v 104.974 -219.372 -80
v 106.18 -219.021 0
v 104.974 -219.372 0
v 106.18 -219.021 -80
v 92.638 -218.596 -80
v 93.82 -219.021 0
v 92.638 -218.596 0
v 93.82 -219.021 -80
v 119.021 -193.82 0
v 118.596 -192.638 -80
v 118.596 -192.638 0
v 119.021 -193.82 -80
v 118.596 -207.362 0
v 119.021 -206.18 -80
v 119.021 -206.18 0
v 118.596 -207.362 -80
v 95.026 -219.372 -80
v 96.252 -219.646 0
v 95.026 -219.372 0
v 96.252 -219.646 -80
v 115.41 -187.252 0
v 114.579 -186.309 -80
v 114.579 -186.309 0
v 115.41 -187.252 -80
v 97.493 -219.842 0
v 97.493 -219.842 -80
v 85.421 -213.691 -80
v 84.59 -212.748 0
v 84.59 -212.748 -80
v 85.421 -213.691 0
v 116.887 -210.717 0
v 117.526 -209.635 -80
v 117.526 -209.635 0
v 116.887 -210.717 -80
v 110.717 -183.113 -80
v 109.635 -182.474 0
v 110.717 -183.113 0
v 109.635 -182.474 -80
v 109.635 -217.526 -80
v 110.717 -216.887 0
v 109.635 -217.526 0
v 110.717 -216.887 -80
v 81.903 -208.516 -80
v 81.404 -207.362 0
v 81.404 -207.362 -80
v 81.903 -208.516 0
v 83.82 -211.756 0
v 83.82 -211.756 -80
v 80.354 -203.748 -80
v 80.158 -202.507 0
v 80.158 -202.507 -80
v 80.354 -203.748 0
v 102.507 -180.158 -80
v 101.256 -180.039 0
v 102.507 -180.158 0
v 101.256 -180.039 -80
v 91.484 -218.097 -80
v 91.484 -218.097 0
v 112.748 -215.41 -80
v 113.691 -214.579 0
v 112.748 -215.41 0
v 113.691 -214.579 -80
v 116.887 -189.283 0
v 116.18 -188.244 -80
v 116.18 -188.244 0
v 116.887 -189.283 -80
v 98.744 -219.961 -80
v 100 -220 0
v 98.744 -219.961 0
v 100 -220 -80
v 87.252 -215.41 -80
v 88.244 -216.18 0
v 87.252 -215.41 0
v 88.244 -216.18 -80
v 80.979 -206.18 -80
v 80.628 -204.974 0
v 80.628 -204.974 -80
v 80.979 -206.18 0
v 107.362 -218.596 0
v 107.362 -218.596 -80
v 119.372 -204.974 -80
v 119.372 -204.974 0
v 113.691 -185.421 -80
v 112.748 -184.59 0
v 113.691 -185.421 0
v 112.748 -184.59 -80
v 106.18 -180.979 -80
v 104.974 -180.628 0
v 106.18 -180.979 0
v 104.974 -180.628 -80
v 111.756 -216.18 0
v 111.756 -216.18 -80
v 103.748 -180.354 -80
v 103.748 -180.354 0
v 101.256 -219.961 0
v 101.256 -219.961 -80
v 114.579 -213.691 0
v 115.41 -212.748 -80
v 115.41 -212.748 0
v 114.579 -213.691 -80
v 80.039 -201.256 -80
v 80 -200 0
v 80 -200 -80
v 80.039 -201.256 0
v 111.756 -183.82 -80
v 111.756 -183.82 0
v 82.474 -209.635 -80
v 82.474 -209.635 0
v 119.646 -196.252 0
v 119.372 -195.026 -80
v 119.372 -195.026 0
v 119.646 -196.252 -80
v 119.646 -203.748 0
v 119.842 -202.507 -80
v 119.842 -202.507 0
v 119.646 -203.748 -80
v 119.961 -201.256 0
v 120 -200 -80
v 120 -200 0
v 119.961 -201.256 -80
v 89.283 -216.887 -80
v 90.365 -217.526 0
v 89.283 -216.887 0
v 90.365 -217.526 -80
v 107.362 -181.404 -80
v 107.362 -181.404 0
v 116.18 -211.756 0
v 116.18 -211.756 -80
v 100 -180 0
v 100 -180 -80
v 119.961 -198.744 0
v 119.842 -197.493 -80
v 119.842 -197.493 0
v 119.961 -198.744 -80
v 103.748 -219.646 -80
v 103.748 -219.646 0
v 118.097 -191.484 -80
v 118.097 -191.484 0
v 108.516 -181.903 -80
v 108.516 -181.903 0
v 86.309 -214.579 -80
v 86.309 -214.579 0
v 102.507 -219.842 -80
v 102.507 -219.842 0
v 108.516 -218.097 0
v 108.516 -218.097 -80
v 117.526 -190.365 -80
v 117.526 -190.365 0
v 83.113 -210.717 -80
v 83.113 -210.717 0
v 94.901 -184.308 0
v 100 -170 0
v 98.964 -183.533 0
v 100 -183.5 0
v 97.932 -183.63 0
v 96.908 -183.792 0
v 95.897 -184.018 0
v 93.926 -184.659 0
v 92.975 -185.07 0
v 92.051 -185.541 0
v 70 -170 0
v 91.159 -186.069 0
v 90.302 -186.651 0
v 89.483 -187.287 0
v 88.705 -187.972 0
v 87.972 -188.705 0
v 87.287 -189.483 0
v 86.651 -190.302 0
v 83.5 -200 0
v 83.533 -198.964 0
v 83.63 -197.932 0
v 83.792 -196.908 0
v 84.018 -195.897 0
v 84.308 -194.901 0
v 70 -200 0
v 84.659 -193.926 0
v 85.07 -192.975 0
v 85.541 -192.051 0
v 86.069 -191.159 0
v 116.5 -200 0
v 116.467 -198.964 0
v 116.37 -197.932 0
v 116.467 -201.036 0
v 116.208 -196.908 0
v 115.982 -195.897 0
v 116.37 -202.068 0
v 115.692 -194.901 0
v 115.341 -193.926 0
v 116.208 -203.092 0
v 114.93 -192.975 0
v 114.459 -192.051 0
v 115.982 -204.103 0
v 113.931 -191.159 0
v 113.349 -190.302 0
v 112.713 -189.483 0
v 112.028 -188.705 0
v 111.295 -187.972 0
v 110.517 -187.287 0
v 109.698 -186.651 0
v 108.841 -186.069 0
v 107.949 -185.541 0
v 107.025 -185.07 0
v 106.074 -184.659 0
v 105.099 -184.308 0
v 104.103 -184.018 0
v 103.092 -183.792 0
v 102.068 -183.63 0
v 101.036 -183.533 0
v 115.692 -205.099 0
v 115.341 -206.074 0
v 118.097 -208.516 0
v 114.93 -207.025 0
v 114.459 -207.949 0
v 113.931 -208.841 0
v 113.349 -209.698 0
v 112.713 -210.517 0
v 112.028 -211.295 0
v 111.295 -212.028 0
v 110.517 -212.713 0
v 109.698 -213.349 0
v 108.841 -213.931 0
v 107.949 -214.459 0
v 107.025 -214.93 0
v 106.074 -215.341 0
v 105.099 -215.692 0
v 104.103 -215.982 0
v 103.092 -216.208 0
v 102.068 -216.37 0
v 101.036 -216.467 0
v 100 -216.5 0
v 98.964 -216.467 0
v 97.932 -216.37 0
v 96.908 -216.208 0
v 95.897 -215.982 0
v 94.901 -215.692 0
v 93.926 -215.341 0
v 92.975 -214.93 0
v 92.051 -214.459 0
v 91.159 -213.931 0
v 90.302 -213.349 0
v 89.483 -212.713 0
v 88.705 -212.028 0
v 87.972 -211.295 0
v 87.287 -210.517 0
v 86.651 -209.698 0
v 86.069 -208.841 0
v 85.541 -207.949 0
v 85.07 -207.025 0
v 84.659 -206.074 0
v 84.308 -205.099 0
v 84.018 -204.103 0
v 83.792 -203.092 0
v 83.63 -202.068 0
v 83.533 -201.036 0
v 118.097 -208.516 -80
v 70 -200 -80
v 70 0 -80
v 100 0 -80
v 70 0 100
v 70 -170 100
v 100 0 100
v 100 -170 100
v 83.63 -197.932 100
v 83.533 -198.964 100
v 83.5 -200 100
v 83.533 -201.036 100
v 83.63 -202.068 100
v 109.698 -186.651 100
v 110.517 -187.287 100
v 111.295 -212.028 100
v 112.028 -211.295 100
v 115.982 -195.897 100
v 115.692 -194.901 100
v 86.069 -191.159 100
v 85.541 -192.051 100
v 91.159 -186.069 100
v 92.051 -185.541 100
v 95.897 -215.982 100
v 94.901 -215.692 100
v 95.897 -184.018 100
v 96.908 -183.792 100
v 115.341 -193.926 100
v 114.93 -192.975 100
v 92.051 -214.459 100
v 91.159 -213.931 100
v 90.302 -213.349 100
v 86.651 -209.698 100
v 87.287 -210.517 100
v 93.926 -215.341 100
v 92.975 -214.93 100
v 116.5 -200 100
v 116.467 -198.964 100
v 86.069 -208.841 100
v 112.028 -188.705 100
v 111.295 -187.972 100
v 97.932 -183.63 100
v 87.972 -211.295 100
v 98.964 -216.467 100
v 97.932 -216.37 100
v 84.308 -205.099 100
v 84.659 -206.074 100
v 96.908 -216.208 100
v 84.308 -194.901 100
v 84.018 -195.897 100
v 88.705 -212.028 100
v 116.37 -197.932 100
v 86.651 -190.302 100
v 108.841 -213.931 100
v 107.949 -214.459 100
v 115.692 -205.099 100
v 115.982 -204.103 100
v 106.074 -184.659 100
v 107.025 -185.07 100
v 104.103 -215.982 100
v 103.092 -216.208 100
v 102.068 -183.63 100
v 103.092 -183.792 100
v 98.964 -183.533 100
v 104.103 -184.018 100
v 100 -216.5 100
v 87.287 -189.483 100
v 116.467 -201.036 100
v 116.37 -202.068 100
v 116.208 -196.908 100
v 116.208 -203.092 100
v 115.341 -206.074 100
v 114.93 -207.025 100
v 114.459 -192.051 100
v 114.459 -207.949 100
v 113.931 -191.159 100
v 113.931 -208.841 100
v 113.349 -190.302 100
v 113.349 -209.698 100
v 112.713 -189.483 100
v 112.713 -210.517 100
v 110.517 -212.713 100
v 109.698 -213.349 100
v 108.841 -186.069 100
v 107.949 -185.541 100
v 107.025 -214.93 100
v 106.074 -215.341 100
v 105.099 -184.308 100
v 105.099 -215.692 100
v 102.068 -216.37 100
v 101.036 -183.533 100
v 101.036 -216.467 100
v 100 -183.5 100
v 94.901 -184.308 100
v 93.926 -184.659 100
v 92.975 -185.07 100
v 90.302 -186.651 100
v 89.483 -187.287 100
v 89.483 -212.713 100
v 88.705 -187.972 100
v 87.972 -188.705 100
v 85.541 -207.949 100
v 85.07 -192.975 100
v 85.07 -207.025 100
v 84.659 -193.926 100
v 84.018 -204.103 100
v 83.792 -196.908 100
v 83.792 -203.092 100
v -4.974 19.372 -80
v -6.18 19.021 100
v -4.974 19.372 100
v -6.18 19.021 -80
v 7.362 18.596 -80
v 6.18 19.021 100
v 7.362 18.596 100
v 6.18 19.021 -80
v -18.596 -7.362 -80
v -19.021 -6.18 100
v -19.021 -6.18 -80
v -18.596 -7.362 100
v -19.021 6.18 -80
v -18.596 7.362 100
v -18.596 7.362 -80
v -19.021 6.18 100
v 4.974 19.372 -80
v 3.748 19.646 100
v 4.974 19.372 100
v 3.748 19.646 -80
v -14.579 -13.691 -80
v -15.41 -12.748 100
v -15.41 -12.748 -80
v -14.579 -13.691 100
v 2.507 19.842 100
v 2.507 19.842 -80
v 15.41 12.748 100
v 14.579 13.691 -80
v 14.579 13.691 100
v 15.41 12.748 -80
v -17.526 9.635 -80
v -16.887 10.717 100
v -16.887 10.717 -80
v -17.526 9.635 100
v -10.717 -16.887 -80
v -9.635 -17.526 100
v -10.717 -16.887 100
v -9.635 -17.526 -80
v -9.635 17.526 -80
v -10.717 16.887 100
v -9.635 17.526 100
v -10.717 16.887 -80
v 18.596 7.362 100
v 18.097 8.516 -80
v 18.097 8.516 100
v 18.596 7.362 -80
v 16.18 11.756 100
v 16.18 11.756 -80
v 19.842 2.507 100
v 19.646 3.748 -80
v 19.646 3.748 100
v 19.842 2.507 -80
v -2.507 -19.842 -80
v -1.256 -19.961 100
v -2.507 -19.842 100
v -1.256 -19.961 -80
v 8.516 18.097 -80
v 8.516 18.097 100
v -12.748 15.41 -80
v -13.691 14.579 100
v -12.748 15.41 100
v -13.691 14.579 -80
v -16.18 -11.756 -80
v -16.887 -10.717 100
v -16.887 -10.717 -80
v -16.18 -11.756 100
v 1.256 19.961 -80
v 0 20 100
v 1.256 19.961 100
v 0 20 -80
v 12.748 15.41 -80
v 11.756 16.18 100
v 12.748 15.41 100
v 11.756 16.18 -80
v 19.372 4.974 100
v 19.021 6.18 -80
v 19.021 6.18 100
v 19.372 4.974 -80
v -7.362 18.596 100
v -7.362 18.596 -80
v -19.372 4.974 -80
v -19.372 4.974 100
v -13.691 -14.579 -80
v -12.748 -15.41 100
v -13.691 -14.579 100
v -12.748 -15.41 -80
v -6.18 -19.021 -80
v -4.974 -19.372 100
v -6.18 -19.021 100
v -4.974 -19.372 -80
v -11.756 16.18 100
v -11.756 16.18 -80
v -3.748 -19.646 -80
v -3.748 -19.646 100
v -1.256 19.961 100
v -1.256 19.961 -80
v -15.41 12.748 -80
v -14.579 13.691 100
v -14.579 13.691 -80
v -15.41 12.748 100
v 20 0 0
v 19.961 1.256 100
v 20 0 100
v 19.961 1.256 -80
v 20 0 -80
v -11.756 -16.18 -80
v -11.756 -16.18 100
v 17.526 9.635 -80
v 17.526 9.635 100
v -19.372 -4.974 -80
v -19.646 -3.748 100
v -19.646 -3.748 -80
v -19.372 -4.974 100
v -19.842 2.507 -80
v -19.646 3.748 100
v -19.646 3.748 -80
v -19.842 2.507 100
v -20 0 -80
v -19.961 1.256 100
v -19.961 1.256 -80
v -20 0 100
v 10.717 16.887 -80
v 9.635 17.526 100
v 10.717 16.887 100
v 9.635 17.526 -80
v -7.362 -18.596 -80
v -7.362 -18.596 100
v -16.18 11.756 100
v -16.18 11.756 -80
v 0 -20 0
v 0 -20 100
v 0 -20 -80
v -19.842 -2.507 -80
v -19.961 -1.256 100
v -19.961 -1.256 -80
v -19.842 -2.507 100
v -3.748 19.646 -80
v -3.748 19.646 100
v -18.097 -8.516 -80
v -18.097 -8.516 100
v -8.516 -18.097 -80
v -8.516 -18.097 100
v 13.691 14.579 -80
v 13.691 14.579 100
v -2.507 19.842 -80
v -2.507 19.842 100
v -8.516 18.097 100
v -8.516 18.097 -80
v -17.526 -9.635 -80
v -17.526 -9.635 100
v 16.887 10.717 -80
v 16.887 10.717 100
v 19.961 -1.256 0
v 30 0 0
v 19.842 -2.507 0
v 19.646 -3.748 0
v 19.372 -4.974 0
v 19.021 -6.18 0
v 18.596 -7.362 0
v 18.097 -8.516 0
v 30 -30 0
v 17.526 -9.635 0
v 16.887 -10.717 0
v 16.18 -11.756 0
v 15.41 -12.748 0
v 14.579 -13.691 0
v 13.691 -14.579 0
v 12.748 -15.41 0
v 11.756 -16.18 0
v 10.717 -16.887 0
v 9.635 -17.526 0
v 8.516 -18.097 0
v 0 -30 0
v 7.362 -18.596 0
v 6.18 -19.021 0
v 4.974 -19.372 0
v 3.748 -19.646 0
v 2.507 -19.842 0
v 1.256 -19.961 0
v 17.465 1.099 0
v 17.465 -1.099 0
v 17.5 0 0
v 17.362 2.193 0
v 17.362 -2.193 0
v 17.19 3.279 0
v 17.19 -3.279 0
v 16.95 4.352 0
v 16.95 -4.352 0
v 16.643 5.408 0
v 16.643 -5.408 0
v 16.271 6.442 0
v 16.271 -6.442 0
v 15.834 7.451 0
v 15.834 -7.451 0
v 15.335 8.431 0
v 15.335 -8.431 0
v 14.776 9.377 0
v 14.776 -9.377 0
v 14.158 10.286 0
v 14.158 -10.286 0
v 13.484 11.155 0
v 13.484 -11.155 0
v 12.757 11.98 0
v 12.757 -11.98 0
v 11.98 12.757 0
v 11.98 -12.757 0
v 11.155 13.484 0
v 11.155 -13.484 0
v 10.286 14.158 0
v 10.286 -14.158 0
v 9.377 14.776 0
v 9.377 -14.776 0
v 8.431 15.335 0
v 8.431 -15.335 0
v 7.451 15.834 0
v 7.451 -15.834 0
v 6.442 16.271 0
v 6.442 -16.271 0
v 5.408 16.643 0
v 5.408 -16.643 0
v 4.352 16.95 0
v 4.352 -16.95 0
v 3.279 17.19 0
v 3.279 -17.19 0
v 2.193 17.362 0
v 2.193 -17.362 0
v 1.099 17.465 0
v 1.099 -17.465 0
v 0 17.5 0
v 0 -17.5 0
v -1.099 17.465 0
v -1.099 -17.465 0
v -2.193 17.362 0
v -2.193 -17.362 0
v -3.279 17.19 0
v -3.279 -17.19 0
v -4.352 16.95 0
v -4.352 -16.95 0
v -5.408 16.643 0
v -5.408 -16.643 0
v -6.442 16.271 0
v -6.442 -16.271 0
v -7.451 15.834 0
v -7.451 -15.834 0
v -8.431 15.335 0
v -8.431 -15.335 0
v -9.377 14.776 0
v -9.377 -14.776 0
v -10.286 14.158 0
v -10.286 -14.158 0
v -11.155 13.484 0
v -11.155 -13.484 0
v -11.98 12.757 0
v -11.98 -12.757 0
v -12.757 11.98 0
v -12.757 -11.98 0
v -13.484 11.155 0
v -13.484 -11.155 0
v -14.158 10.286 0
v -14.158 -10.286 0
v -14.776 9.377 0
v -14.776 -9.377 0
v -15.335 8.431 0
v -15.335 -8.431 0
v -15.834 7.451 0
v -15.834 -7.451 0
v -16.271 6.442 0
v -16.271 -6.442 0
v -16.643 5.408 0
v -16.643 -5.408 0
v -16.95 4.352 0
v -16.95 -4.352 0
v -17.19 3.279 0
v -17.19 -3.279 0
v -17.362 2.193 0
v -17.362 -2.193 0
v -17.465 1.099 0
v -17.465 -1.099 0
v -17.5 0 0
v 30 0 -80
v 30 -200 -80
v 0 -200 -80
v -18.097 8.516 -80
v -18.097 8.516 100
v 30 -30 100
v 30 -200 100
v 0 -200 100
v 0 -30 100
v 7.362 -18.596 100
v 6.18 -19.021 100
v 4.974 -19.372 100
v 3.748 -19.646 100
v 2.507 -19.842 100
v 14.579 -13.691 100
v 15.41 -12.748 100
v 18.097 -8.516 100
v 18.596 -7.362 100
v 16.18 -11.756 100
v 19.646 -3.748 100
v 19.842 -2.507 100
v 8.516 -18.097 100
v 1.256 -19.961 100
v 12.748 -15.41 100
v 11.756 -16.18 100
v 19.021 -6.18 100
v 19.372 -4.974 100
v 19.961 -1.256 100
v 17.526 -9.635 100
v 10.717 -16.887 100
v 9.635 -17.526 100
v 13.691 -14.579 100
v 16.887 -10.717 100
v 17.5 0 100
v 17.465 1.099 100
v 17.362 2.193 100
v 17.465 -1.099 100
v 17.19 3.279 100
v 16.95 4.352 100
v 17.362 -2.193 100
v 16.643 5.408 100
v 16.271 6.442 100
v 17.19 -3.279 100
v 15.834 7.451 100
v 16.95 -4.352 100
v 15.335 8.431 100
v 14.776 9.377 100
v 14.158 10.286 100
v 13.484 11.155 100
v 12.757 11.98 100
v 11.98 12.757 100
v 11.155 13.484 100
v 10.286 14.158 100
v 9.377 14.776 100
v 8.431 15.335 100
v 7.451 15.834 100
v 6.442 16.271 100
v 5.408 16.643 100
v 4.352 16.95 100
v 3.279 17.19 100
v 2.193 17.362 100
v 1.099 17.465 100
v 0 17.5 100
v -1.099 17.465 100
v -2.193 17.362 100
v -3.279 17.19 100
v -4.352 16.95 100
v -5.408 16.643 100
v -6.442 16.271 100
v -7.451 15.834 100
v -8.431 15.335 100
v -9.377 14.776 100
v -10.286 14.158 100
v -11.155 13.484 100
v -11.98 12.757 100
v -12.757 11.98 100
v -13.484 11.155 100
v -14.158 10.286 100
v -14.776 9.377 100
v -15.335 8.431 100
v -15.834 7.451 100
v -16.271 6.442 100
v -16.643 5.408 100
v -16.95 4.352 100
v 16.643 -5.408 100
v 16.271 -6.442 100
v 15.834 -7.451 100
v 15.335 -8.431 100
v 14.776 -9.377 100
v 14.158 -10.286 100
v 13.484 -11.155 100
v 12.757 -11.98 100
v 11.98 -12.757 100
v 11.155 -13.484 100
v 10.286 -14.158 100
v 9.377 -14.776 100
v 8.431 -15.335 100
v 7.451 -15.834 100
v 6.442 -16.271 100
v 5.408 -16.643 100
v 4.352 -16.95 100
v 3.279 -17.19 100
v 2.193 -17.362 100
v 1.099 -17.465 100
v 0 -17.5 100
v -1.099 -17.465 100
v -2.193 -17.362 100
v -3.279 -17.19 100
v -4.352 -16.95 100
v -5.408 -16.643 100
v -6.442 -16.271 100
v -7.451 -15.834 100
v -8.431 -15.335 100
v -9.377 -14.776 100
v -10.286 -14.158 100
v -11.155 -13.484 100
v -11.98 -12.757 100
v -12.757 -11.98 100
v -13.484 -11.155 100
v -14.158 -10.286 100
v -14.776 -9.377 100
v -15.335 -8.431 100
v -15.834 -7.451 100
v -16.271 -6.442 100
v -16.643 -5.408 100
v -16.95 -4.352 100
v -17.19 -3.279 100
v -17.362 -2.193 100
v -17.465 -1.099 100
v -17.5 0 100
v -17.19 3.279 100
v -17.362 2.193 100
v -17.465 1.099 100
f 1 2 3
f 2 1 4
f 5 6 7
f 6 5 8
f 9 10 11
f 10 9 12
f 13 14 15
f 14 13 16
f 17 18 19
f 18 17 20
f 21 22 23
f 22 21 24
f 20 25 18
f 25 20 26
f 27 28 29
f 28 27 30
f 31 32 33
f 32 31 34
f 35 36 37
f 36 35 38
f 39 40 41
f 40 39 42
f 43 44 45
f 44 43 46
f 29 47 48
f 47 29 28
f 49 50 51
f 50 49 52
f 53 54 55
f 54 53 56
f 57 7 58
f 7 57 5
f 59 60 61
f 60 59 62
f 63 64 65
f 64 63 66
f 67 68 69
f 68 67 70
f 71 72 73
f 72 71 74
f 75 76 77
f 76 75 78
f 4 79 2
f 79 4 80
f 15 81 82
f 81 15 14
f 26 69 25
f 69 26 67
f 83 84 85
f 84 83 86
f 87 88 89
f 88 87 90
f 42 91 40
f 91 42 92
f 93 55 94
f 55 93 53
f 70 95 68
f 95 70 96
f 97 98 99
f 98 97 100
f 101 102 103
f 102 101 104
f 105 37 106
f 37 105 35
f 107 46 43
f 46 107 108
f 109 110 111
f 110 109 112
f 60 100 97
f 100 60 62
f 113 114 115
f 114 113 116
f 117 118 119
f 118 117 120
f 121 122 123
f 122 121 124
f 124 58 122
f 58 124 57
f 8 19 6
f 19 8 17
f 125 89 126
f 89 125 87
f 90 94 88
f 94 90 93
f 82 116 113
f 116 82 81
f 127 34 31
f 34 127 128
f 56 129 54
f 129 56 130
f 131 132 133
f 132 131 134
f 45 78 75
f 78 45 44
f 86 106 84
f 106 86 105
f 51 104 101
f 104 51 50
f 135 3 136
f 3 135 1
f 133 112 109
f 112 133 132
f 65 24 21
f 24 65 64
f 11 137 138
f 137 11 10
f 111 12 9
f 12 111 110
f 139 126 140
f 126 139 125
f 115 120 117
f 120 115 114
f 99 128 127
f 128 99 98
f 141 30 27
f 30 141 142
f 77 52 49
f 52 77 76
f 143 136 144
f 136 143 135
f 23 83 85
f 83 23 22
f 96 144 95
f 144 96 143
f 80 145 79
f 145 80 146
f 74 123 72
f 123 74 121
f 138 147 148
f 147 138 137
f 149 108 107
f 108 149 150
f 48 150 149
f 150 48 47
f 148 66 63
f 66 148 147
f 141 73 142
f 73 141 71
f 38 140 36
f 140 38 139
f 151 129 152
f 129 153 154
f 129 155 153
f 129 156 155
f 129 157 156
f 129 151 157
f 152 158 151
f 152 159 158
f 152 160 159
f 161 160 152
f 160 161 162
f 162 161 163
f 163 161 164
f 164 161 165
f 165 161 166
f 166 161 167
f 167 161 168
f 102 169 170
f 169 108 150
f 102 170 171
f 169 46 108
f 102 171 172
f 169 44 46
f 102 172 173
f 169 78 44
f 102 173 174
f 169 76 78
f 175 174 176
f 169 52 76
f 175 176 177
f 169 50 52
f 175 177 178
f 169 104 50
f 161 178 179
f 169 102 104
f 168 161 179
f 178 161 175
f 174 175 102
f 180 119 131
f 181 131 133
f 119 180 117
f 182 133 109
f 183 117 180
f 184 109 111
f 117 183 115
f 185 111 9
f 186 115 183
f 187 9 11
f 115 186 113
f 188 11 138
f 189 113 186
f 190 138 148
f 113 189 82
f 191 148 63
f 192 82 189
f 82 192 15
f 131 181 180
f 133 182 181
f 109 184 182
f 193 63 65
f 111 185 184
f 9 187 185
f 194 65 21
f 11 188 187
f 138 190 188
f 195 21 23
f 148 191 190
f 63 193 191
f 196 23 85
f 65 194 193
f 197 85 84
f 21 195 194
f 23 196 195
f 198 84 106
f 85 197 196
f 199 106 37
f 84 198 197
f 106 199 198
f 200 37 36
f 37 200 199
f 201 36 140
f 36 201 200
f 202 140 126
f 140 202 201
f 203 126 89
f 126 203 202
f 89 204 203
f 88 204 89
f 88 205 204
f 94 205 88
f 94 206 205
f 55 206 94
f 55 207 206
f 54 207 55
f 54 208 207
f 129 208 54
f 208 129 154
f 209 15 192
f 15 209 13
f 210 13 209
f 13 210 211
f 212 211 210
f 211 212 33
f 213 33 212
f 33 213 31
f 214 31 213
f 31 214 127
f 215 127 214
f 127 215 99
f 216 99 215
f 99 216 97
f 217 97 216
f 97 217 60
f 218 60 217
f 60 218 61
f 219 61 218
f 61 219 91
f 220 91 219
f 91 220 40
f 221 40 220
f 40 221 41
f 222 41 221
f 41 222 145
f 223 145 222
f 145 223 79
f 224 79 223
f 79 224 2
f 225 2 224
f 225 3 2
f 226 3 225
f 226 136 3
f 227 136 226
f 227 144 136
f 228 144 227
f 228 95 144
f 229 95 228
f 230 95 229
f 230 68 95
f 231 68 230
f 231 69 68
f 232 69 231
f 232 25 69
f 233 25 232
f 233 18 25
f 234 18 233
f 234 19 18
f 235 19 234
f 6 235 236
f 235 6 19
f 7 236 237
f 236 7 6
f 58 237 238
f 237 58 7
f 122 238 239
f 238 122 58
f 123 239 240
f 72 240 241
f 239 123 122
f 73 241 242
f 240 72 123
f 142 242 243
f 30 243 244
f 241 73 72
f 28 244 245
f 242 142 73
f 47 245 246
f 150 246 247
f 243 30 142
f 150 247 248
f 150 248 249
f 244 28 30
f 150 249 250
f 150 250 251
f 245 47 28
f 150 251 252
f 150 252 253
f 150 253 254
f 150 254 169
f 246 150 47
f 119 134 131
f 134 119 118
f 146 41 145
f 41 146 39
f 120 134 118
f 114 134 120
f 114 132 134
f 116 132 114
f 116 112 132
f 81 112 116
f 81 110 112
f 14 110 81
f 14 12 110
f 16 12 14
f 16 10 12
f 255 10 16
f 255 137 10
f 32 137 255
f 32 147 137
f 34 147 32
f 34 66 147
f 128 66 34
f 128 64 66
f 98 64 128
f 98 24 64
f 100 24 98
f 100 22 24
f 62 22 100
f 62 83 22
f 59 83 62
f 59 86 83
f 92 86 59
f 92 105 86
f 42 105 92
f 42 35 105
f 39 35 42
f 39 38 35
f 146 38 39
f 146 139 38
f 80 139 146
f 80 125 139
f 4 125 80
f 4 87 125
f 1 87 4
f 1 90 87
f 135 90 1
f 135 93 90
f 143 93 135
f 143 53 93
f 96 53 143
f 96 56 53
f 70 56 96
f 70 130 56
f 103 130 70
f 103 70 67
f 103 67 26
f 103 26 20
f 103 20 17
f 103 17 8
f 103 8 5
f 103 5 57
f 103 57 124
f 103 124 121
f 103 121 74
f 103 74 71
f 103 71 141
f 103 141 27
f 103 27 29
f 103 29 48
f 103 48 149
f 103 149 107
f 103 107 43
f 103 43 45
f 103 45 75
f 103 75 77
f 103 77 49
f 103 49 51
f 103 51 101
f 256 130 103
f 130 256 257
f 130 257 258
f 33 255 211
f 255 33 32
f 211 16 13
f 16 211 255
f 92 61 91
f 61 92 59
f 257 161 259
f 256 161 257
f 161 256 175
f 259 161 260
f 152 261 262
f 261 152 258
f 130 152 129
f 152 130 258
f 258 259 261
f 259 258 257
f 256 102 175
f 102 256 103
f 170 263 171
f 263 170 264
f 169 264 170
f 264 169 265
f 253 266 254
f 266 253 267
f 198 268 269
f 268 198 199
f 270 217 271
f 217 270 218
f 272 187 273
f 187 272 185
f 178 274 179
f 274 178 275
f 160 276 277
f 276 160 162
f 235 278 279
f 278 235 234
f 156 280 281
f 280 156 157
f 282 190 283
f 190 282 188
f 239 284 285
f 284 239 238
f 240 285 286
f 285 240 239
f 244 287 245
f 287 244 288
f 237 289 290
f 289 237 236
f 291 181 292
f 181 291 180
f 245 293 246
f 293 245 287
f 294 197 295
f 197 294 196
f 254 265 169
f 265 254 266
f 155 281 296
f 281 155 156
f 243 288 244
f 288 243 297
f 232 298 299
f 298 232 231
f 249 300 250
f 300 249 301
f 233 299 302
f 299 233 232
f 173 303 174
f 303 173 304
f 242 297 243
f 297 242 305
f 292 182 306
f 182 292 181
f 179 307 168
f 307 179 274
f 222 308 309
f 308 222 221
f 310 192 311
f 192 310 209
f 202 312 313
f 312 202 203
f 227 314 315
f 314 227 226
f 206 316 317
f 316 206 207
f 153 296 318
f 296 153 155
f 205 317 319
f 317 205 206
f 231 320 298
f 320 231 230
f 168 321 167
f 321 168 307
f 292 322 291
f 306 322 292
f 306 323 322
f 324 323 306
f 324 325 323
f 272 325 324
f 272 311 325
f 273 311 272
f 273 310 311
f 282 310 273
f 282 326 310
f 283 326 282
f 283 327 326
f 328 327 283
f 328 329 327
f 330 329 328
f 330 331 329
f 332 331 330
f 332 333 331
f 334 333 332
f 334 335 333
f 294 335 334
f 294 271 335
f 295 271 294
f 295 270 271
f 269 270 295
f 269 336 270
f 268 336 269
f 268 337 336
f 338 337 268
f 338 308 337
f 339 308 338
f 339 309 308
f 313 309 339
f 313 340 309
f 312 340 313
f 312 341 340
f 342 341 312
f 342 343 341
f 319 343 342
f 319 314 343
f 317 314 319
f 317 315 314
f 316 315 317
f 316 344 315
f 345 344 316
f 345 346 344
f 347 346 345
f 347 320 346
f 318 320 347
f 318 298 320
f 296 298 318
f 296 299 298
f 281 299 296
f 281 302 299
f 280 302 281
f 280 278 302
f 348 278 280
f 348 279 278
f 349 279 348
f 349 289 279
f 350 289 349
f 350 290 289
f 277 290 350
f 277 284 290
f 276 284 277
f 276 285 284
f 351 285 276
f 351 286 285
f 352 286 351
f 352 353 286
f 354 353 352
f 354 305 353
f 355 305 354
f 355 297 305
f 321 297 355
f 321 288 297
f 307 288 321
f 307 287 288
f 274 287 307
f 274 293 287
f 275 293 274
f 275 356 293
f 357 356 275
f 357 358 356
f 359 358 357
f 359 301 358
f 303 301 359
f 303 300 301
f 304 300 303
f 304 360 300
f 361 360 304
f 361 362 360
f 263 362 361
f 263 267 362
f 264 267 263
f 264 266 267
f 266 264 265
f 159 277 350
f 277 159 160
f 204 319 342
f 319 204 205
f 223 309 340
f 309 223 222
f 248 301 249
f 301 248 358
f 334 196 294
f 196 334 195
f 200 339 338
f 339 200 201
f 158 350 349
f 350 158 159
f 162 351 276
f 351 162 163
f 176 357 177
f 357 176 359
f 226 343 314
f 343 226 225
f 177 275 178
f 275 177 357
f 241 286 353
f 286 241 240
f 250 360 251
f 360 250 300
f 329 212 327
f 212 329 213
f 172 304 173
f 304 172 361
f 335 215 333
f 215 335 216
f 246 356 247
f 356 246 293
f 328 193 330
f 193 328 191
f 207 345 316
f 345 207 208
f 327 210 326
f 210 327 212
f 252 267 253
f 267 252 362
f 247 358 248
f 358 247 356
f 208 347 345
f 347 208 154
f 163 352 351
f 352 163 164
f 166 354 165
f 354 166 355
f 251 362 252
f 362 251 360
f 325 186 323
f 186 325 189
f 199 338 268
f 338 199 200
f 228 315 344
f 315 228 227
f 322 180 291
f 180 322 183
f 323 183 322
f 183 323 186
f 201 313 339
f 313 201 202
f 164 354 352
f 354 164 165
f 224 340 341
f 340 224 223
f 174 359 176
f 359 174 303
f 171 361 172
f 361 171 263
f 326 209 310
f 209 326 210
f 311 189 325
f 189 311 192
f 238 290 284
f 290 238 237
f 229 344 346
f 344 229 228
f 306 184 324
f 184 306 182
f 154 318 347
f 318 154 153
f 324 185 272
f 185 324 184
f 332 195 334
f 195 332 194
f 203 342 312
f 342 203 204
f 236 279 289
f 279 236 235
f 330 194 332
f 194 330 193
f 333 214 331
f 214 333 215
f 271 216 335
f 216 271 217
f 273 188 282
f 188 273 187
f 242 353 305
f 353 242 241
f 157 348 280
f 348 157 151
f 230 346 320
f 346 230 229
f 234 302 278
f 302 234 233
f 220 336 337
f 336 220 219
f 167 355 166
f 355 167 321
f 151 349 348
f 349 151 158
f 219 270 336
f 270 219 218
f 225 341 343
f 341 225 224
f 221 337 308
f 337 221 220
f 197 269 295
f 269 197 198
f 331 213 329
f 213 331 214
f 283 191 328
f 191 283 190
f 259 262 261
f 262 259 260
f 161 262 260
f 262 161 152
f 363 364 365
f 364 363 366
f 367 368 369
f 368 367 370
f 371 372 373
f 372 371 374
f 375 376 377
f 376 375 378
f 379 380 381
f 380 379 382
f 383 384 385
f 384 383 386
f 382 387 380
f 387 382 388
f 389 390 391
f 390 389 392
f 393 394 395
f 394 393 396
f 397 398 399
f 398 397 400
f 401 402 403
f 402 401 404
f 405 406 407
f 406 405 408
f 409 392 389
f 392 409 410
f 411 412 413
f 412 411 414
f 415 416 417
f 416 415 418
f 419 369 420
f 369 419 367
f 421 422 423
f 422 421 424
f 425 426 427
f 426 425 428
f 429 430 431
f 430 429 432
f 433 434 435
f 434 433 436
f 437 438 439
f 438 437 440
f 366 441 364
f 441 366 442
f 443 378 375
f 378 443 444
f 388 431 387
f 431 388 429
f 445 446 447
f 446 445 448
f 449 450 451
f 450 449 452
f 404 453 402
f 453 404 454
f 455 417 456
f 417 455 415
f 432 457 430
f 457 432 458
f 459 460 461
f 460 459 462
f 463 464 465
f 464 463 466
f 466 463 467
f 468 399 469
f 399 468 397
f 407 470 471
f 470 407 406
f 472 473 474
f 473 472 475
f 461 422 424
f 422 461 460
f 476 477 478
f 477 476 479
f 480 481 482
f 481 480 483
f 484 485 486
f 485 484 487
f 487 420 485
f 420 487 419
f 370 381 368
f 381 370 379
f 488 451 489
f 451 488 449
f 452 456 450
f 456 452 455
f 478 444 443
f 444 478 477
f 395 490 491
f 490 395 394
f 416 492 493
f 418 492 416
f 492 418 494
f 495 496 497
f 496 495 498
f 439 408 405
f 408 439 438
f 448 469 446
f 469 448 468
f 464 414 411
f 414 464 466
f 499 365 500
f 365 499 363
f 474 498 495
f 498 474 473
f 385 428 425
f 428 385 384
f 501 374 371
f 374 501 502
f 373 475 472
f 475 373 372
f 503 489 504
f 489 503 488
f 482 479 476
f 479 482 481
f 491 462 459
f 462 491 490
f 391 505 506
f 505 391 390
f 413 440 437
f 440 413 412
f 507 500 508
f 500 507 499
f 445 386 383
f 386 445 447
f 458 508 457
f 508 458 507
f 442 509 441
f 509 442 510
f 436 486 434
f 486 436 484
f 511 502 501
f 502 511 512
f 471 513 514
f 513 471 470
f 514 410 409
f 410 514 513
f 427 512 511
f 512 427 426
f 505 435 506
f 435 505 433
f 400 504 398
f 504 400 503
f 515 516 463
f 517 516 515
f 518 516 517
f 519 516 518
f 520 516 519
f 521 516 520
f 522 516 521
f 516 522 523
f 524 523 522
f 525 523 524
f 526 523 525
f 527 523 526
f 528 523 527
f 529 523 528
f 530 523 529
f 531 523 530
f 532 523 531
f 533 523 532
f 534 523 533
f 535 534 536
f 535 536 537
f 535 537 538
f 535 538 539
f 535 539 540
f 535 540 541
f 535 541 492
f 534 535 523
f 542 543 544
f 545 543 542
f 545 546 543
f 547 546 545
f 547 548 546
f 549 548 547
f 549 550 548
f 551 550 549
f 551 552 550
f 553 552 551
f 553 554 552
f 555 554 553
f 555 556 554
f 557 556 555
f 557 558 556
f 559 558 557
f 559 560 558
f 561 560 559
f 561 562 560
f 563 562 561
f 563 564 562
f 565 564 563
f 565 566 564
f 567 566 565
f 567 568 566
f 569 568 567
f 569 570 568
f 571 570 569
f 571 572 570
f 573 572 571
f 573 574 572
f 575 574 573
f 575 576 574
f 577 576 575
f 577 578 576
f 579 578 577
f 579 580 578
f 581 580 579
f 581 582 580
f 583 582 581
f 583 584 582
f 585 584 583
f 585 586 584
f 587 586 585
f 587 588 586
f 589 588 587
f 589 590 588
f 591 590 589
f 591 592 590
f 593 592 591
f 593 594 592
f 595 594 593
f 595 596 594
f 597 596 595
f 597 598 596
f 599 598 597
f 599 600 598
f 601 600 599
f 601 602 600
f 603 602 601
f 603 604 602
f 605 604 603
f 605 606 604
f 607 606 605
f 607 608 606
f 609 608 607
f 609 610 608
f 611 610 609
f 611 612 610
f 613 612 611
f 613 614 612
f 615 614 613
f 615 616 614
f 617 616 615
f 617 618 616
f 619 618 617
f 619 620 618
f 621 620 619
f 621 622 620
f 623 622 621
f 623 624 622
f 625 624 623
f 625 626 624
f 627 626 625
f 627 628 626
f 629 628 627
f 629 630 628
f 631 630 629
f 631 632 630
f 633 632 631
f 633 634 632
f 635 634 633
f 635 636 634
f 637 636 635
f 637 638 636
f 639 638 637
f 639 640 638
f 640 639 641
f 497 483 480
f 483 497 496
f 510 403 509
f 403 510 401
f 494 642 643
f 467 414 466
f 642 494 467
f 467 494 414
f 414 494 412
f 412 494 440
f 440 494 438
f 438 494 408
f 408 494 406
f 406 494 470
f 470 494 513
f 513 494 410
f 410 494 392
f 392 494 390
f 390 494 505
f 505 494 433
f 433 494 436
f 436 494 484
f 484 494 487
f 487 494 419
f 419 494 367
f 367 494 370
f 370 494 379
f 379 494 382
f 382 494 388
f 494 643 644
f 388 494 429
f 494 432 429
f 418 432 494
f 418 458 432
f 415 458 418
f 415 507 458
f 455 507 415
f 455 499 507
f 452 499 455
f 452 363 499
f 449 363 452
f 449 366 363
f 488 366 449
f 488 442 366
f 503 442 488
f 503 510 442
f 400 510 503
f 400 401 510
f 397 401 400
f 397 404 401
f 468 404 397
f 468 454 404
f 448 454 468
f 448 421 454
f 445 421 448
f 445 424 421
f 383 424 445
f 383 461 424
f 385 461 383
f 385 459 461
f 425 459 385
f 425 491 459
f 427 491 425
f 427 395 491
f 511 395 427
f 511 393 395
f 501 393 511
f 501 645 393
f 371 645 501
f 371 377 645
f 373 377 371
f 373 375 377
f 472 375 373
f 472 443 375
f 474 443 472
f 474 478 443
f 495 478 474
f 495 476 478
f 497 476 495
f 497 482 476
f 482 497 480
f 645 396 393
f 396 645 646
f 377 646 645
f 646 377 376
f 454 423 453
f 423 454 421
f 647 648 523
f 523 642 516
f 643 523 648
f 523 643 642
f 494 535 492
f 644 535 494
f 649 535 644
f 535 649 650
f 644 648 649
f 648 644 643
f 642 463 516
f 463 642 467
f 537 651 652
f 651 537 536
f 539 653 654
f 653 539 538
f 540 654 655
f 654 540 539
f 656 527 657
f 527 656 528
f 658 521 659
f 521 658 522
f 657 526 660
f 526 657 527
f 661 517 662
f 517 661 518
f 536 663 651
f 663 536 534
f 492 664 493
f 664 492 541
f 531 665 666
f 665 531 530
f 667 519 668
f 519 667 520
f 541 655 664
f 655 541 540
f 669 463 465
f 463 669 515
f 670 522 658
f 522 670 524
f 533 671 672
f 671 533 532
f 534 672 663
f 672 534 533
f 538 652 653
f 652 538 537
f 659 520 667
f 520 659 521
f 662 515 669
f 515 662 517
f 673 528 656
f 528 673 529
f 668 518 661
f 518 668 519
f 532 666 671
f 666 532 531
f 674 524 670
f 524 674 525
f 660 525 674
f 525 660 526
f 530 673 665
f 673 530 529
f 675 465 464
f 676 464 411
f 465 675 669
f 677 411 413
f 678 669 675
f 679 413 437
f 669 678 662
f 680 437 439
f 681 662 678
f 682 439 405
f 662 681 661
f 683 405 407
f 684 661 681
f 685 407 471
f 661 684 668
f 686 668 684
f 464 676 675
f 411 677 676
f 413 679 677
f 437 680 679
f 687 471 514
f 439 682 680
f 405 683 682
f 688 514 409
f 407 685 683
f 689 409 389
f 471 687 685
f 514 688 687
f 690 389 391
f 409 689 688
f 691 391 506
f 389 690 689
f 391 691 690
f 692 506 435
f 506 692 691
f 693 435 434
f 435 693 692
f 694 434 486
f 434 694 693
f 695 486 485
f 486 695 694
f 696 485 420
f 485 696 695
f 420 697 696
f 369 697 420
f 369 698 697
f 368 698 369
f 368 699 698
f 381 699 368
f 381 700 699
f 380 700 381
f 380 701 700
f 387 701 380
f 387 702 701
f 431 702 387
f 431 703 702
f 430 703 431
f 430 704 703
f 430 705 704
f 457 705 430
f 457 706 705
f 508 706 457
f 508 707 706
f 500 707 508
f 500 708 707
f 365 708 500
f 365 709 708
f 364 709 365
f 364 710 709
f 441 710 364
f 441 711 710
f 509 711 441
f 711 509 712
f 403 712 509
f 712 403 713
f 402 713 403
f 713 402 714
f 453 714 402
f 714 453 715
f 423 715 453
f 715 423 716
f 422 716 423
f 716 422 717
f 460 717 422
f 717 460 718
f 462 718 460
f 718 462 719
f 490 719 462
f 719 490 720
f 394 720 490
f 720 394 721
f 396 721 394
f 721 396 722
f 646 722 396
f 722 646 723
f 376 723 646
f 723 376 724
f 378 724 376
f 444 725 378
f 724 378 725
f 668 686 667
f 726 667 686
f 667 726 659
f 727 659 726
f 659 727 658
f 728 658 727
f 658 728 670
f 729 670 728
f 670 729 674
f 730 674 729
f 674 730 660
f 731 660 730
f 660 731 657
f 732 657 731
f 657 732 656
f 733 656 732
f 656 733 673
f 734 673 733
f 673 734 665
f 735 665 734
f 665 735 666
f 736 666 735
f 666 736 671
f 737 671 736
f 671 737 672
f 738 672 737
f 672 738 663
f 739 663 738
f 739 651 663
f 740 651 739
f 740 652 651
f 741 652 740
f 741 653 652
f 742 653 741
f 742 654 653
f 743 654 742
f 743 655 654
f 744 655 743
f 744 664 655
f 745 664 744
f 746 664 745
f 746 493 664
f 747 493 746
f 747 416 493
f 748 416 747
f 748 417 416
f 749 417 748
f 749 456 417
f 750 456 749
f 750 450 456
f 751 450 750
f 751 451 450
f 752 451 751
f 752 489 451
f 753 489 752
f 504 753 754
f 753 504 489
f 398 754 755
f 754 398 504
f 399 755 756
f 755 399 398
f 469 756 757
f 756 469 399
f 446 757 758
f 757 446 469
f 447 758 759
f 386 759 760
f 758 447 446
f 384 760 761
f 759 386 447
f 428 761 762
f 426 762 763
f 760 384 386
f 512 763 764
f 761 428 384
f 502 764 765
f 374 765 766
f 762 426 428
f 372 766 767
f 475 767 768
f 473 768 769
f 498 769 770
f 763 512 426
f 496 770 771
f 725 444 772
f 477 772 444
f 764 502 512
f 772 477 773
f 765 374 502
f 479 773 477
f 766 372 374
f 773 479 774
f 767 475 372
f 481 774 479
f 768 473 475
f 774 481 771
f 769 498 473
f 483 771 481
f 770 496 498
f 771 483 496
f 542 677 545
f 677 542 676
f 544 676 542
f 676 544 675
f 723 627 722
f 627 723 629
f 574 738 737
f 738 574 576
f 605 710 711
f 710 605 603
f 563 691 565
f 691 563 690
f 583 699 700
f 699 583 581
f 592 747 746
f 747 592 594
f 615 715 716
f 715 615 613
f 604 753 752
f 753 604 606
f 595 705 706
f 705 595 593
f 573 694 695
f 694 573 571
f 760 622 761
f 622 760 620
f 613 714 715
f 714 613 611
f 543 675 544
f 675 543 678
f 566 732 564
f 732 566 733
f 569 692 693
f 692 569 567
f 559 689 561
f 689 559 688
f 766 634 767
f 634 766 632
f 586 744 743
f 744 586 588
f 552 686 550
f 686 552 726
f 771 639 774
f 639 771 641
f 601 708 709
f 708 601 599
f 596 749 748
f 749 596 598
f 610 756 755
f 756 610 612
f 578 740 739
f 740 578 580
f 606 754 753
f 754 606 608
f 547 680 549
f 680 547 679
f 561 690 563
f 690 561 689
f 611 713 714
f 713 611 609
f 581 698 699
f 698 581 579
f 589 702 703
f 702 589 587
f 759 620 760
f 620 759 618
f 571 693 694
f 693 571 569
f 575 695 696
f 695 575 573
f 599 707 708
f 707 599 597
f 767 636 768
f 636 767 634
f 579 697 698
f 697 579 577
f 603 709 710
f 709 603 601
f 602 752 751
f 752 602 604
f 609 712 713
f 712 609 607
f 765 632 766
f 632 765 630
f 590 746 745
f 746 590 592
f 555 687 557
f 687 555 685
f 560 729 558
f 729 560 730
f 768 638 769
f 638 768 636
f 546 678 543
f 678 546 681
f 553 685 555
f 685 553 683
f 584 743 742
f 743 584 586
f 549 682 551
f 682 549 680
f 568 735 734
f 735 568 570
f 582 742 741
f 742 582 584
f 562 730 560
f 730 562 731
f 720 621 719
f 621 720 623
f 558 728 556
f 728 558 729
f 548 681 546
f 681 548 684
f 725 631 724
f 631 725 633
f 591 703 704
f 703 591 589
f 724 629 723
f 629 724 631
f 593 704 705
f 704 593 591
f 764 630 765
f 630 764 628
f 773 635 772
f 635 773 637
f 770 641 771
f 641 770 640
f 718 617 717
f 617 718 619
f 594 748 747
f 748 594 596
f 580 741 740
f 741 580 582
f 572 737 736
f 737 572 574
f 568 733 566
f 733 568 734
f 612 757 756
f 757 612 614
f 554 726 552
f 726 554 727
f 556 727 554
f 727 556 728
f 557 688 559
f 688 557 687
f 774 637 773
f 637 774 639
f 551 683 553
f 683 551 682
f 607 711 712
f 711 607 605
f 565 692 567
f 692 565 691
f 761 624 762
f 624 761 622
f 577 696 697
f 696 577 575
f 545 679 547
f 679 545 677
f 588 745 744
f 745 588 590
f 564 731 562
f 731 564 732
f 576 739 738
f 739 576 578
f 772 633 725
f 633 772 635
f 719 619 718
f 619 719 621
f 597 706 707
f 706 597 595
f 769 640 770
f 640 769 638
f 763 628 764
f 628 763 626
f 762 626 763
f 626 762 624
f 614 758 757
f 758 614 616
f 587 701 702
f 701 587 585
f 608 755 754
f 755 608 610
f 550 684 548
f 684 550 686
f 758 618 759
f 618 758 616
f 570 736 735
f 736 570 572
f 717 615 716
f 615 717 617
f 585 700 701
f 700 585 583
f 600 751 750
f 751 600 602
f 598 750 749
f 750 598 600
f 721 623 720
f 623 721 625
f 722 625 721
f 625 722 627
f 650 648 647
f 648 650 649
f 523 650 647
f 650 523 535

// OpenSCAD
// file: tube.scad
module tube(outer_dia, inner_dia, height) {
    difference() {
        cylinder(d=outer_dia, h=height);
        cylinder(d=inner_dia, h=height);
    }
}

tube(20, 17, 50);
// main file
use<tube.scad>

$fn=100;

module hinge() {

tolerance=0.3;

module base() {
    cylinder(r=2, h=8);
    cube([3, 20, 8]);
}

module male() {
    translate([0, 10, 0]) {
        base();
        translate([0, 0, -10]) {
            cylinder(d=3.3, h=10);
            translate([0, 3, 0]) cube([3, 17, 10]);
        }
    }
}

module female() {
    rotate(v=[1, 0, 0], a=180) {
        base();
    }
    tube(outer_dia=4, inner_dia=3.5, height=10);
    translate([0, -20, 0]) cube([3, 17, 10]);
}


translate([10, -30, 0]) rotate(a=180, v=[0,1,0]) male();
female();

}

scale([10, 10, 10]) hinge();
